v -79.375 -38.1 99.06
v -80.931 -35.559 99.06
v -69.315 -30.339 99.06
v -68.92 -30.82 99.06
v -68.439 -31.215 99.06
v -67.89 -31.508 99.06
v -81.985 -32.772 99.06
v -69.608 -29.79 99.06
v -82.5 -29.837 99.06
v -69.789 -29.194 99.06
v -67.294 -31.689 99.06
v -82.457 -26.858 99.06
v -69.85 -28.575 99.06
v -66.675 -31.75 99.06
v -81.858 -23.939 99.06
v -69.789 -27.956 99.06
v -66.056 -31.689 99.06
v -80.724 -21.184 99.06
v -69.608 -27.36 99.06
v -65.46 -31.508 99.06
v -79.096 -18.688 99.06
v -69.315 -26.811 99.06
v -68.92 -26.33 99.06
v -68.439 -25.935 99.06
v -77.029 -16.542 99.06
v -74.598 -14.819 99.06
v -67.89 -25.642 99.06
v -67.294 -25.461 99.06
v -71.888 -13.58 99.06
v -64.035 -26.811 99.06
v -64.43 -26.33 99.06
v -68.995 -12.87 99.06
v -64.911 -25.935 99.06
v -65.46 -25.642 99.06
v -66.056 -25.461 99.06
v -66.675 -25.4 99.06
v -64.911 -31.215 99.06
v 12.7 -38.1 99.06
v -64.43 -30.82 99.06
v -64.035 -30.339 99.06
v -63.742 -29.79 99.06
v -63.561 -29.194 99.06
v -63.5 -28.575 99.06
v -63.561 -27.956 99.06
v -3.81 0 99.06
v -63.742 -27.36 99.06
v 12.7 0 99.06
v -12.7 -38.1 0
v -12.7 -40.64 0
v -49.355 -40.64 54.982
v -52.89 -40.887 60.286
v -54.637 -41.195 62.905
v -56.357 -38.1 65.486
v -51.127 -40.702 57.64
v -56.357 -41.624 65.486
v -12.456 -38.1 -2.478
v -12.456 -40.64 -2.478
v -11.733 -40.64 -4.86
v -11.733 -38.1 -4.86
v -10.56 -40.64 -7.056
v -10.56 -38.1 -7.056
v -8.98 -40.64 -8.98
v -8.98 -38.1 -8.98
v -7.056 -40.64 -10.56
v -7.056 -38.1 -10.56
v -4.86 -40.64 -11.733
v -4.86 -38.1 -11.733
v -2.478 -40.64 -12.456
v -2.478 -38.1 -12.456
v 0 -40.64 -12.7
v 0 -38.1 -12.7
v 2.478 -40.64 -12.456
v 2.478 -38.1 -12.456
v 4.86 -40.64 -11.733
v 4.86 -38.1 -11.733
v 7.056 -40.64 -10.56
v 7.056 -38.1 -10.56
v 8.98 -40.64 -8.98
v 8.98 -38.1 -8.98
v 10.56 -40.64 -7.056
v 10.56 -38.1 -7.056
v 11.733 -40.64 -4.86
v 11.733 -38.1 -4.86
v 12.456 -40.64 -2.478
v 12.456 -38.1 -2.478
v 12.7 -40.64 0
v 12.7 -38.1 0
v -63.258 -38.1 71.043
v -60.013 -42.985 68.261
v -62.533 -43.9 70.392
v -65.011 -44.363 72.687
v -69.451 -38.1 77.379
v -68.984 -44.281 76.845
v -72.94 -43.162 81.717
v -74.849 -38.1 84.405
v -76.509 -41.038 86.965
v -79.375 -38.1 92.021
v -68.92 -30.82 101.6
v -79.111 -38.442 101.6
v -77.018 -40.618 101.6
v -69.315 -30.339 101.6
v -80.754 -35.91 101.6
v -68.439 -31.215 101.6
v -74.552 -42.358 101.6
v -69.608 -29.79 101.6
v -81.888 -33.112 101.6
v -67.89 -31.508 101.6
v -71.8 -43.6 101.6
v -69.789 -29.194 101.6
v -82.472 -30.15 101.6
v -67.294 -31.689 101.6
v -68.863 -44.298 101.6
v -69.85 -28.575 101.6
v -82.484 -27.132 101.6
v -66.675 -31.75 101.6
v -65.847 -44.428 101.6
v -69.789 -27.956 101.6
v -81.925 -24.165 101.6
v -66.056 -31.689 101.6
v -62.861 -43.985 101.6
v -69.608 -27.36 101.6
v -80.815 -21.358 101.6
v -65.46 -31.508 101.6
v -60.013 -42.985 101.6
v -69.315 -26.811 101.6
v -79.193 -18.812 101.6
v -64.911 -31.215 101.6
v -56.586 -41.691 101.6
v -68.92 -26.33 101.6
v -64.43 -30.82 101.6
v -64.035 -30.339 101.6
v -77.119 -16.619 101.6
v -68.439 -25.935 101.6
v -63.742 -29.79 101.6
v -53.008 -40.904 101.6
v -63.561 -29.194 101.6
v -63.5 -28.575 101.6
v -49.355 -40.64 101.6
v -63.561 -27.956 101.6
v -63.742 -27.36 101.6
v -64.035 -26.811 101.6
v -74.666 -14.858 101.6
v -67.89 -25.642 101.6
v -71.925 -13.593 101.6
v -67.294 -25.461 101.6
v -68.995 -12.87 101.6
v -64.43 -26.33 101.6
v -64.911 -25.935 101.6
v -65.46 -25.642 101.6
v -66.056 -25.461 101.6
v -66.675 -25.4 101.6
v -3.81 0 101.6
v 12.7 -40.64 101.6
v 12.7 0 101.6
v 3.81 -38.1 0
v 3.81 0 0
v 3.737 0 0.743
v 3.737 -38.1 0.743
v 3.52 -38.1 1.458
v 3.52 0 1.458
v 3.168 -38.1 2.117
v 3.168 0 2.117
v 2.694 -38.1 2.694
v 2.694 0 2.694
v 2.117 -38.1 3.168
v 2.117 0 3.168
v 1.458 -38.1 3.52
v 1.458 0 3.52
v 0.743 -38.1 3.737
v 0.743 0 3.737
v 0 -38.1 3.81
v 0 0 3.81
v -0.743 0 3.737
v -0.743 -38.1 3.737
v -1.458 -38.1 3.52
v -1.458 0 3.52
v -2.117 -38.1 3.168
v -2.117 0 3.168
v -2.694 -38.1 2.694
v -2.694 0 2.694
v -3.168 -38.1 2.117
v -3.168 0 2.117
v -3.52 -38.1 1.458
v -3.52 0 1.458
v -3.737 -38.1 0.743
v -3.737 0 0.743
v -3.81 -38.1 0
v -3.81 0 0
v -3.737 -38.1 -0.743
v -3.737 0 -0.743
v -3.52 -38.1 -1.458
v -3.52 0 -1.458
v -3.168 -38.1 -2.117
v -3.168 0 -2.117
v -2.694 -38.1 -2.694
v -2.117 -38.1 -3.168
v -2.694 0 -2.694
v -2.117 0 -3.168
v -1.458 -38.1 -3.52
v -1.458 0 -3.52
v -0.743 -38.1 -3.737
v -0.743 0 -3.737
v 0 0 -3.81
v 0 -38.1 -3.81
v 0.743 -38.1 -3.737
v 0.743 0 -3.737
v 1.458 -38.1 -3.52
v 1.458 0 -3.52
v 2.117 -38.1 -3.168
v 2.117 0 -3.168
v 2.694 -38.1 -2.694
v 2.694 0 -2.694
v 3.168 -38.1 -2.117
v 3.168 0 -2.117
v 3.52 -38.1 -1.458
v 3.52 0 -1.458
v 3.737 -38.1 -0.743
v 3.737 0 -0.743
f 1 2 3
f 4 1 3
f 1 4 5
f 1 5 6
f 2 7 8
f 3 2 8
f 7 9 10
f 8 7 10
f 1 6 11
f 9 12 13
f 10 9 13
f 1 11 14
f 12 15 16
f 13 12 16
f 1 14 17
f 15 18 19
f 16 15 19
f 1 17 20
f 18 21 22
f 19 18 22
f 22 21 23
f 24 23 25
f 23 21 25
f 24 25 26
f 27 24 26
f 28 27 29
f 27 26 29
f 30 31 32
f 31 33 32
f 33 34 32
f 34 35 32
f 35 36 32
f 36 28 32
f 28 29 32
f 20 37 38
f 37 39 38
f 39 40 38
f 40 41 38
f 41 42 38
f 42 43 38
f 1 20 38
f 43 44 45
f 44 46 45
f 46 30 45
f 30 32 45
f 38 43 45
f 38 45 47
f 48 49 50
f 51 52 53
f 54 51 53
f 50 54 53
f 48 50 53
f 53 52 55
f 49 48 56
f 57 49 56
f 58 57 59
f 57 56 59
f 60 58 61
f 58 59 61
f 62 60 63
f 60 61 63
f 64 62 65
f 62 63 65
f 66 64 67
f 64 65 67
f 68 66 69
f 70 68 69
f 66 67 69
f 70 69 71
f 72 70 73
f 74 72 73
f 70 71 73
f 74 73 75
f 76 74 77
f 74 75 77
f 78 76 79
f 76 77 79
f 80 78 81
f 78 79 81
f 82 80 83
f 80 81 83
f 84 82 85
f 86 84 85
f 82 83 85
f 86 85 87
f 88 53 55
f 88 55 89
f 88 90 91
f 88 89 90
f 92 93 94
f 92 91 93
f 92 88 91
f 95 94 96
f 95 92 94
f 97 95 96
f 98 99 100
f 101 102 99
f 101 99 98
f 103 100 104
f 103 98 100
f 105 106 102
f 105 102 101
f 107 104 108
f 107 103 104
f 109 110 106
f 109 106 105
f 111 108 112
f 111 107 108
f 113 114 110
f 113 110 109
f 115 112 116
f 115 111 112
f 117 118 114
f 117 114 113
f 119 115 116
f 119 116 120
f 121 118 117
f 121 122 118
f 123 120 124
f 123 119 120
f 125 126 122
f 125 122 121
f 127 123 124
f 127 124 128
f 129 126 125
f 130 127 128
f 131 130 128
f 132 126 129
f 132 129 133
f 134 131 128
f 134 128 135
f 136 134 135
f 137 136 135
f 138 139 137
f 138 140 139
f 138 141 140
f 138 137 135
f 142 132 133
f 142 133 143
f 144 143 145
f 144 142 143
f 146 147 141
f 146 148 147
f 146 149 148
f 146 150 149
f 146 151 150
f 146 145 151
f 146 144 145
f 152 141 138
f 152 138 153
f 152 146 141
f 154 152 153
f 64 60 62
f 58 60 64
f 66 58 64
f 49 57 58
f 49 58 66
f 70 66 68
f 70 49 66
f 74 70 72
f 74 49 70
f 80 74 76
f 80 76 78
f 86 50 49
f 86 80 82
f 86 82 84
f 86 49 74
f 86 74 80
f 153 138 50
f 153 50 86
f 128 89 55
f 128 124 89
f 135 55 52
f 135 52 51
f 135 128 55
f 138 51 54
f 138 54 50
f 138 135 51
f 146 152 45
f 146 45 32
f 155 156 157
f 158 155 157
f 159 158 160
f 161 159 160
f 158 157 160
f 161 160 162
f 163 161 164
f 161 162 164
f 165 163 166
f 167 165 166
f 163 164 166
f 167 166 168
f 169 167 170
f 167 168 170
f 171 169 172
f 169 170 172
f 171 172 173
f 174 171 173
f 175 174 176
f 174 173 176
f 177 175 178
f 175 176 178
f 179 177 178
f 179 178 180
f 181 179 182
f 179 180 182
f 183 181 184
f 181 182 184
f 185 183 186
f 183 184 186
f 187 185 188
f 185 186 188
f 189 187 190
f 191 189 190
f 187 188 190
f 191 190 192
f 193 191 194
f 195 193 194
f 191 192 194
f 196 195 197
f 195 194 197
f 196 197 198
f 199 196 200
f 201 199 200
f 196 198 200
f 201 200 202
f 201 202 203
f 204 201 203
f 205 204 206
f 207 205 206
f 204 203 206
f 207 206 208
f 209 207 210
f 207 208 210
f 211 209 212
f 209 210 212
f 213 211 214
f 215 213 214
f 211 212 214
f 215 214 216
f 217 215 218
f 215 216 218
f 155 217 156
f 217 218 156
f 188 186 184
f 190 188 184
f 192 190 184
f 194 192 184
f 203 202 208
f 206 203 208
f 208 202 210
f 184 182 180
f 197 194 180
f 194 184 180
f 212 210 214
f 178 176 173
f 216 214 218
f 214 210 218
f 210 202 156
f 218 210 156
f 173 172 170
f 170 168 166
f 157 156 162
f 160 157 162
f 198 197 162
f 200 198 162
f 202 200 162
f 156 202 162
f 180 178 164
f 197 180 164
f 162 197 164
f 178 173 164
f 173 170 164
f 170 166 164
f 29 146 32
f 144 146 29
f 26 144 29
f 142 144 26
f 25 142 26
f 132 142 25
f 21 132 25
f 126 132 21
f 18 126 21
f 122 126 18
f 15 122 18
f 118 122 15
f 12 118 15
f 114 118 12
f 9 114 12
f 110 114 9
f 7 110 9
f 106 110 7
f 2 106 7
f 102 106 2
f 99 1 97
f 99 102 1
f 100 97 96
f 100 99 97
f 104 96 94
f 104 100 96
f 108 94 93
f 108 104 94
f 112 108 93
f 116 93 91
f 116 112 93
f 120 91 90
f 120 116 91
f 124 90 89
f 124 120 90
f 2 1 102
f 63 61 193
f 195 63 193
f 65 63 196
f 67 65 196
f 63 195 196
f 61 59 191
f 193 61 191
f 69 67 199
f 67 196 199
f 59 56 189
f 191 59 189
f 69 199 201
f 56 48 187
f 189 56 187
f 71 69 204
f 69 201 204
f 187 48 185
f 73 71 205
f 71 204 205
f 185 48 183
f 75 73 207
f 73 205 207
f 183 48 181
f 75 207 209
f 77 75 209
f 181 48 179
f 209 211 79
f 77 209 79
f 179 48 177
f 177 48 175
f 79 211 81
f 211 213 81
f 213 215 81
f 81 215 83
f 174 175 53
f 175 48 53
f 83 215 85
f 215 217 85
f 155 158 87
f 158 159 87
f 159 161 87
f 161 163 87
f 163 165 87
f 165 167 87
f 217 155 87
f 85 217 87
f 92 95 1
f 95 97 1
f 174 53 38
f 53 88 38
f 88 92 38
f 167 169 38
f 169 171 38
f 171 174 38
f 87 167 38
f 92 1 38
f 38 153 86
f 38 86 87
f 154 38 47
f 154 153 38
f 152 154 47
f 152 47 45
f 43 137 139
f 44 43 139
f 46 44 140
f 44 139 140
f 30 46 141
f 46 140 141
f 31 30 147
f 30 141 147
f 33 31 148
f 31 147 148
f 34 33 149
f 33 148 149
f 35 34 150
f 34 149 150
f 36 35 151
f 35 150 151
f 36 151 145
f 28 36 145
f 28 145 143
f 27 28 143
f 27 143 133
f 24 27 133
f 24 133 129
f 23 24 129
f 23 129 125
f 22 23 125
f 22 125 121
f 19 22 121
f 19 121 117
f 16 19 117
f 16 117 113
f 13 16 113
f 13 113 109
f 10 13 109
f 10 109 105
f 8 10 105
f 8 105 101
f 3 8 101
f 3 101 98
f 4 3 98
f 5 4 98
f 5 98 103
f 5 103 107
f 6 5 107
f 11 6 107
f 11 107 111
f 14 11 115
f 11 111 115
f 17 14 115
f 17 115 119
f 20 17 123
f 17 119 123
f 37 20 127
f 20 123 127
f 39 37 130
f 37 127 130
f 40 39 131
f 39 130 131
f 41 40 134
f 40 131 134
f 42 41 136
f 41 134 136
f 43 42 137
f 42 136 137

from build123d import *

# Parameters (mm, degrees)
F0_R          = 3.81
F1_DEPTH      = 38.1
F3_DEPTH      = 2.54
F4_R          = 15.875
F5_DEPTH      = 57.912
F7_DEPTH      = 40.64
F7_DEPTH_BACK = 30.988
F9_DEPTH      = 140.716
F11_DEPTH     = 2.54
F12_R         = 25.4
F13_R         = 3.175
F14_DEPTH     = 25.4


with BuildPart() as f1:
    # F0 (on Front) → F1 (new body)
    with BuildSketch(Plane.XZ):
        Circle(F0_R)
    extrude(amount=F1_DEPTH)

    # F2 (on face) → F3 (join)
    with BuildSketch(Plane.XZ.offset(38.1)):
        with BuildLine():
            ThreePointArc((-12.7, 0), (0, -12.7), (12.7, 0))
            ThreePointArc((12.7, 0), (0, 12.7), (-12.7, 0))
        make_face()
        with BuildLine():
            ThreePointArc((-12.7, 0), (0, 12.7), (12.7, 0))
            Line((12.7, 0), (12.7, 101.6))
            Line((12.7, 101.6), (-63.5, 101.6))
            Line((-63.5, 101.6), (-63.5, 76.2))
            Line((-63.5, 76.2), (-12.7, 0))
        make_face()
    extrude(amount=F3_DEPTH)

    # F4 (on face) → F5 (join)
    with BuildSketch(Plane.XY.offset(101.6)):
        with Locations((-66.675, -28.575)):
            Circle(F4_R)
    extrude(amount=-F5_DEPTH)

    # F6 (on face) → F7 (cut, two sides)
    with BuildSketch(Plane.XZ.offset(40.64)) as f7_sk:
        with BuildLine():
            Line((-44.4512212261, -6.503643468), (-12.7, 0))
            Line((-12.7, 0), (-56.3574712261, 65.4862068392))
            ThreePointArc((-56.3574712261, 65.4862068392), (-73.8011886318, 82.898697178), (-84.6138894558, 105.0473675132))
            Line((-84.6138894558, 105.0473675132), (-88.3945673704, 14.1553971916))
            Line((-88.3945673704, 14.1553971916), (-44.4512212261, -6.503643468))
        make_face()
    extrude(amount=-F7_DEPTH, mode=Mode.SUBTRACT)
    extrude(f7_sk.sketch, amount=F7_DEPTH_BACK, mode=Mode.SUBTRACT)

    # F8 (on face) → F9 (cut)
    with BuildSketch(Plane.YZ.offset(12.7)):
        Polygon((-6.1655906029, 4.6855383553), (-6.1655906029, 63.5), (-6.1655906029, 99.06), (-38.1, 99.06), (-38.1, 4.6855383553), align=None)
    extrude(amount=-F9_DEPTH, mode=Mode.SUBTRACT)

    # F10 (on face) → F11 (join)
    with BuildSketch(Plane.XY.offset(101.6)):
        with BuildLine():
            Line((-53.975, -38.1), (12.7, -38.1))
            Line((12.7, -38.1), (12.7, 0))
            Line((12.7, 0), (-3.81, 0))
            Line((-3.81, 0), (-68.9945726443, -12.8703762303))
            ThreePointArc((-68.9945726443, -12.8703762303), (-53.0341863545, -20.4544194735), (-53.975, -38.1))
        make_face()
    extrude(amount=-F11_DEPTH)

    # F12
    f12_edges = [f1.edges().sort_by_distance(p)[0] for p in [
        (-56.357471, -40.64, 83.543103),
    ]]
    fillet(f12_edges, radius=F12_R)

    # F13 (on face) → F14 (cut)
    with BuildSketch(Plane.XY.offset(101.6)):
        with Locations((-66.675, -28.575)):
            Circle(F13_R)
    extrude(amount=-F14_DEPTH, mode=Mode.SUBTRACT)


solid = f1.part
